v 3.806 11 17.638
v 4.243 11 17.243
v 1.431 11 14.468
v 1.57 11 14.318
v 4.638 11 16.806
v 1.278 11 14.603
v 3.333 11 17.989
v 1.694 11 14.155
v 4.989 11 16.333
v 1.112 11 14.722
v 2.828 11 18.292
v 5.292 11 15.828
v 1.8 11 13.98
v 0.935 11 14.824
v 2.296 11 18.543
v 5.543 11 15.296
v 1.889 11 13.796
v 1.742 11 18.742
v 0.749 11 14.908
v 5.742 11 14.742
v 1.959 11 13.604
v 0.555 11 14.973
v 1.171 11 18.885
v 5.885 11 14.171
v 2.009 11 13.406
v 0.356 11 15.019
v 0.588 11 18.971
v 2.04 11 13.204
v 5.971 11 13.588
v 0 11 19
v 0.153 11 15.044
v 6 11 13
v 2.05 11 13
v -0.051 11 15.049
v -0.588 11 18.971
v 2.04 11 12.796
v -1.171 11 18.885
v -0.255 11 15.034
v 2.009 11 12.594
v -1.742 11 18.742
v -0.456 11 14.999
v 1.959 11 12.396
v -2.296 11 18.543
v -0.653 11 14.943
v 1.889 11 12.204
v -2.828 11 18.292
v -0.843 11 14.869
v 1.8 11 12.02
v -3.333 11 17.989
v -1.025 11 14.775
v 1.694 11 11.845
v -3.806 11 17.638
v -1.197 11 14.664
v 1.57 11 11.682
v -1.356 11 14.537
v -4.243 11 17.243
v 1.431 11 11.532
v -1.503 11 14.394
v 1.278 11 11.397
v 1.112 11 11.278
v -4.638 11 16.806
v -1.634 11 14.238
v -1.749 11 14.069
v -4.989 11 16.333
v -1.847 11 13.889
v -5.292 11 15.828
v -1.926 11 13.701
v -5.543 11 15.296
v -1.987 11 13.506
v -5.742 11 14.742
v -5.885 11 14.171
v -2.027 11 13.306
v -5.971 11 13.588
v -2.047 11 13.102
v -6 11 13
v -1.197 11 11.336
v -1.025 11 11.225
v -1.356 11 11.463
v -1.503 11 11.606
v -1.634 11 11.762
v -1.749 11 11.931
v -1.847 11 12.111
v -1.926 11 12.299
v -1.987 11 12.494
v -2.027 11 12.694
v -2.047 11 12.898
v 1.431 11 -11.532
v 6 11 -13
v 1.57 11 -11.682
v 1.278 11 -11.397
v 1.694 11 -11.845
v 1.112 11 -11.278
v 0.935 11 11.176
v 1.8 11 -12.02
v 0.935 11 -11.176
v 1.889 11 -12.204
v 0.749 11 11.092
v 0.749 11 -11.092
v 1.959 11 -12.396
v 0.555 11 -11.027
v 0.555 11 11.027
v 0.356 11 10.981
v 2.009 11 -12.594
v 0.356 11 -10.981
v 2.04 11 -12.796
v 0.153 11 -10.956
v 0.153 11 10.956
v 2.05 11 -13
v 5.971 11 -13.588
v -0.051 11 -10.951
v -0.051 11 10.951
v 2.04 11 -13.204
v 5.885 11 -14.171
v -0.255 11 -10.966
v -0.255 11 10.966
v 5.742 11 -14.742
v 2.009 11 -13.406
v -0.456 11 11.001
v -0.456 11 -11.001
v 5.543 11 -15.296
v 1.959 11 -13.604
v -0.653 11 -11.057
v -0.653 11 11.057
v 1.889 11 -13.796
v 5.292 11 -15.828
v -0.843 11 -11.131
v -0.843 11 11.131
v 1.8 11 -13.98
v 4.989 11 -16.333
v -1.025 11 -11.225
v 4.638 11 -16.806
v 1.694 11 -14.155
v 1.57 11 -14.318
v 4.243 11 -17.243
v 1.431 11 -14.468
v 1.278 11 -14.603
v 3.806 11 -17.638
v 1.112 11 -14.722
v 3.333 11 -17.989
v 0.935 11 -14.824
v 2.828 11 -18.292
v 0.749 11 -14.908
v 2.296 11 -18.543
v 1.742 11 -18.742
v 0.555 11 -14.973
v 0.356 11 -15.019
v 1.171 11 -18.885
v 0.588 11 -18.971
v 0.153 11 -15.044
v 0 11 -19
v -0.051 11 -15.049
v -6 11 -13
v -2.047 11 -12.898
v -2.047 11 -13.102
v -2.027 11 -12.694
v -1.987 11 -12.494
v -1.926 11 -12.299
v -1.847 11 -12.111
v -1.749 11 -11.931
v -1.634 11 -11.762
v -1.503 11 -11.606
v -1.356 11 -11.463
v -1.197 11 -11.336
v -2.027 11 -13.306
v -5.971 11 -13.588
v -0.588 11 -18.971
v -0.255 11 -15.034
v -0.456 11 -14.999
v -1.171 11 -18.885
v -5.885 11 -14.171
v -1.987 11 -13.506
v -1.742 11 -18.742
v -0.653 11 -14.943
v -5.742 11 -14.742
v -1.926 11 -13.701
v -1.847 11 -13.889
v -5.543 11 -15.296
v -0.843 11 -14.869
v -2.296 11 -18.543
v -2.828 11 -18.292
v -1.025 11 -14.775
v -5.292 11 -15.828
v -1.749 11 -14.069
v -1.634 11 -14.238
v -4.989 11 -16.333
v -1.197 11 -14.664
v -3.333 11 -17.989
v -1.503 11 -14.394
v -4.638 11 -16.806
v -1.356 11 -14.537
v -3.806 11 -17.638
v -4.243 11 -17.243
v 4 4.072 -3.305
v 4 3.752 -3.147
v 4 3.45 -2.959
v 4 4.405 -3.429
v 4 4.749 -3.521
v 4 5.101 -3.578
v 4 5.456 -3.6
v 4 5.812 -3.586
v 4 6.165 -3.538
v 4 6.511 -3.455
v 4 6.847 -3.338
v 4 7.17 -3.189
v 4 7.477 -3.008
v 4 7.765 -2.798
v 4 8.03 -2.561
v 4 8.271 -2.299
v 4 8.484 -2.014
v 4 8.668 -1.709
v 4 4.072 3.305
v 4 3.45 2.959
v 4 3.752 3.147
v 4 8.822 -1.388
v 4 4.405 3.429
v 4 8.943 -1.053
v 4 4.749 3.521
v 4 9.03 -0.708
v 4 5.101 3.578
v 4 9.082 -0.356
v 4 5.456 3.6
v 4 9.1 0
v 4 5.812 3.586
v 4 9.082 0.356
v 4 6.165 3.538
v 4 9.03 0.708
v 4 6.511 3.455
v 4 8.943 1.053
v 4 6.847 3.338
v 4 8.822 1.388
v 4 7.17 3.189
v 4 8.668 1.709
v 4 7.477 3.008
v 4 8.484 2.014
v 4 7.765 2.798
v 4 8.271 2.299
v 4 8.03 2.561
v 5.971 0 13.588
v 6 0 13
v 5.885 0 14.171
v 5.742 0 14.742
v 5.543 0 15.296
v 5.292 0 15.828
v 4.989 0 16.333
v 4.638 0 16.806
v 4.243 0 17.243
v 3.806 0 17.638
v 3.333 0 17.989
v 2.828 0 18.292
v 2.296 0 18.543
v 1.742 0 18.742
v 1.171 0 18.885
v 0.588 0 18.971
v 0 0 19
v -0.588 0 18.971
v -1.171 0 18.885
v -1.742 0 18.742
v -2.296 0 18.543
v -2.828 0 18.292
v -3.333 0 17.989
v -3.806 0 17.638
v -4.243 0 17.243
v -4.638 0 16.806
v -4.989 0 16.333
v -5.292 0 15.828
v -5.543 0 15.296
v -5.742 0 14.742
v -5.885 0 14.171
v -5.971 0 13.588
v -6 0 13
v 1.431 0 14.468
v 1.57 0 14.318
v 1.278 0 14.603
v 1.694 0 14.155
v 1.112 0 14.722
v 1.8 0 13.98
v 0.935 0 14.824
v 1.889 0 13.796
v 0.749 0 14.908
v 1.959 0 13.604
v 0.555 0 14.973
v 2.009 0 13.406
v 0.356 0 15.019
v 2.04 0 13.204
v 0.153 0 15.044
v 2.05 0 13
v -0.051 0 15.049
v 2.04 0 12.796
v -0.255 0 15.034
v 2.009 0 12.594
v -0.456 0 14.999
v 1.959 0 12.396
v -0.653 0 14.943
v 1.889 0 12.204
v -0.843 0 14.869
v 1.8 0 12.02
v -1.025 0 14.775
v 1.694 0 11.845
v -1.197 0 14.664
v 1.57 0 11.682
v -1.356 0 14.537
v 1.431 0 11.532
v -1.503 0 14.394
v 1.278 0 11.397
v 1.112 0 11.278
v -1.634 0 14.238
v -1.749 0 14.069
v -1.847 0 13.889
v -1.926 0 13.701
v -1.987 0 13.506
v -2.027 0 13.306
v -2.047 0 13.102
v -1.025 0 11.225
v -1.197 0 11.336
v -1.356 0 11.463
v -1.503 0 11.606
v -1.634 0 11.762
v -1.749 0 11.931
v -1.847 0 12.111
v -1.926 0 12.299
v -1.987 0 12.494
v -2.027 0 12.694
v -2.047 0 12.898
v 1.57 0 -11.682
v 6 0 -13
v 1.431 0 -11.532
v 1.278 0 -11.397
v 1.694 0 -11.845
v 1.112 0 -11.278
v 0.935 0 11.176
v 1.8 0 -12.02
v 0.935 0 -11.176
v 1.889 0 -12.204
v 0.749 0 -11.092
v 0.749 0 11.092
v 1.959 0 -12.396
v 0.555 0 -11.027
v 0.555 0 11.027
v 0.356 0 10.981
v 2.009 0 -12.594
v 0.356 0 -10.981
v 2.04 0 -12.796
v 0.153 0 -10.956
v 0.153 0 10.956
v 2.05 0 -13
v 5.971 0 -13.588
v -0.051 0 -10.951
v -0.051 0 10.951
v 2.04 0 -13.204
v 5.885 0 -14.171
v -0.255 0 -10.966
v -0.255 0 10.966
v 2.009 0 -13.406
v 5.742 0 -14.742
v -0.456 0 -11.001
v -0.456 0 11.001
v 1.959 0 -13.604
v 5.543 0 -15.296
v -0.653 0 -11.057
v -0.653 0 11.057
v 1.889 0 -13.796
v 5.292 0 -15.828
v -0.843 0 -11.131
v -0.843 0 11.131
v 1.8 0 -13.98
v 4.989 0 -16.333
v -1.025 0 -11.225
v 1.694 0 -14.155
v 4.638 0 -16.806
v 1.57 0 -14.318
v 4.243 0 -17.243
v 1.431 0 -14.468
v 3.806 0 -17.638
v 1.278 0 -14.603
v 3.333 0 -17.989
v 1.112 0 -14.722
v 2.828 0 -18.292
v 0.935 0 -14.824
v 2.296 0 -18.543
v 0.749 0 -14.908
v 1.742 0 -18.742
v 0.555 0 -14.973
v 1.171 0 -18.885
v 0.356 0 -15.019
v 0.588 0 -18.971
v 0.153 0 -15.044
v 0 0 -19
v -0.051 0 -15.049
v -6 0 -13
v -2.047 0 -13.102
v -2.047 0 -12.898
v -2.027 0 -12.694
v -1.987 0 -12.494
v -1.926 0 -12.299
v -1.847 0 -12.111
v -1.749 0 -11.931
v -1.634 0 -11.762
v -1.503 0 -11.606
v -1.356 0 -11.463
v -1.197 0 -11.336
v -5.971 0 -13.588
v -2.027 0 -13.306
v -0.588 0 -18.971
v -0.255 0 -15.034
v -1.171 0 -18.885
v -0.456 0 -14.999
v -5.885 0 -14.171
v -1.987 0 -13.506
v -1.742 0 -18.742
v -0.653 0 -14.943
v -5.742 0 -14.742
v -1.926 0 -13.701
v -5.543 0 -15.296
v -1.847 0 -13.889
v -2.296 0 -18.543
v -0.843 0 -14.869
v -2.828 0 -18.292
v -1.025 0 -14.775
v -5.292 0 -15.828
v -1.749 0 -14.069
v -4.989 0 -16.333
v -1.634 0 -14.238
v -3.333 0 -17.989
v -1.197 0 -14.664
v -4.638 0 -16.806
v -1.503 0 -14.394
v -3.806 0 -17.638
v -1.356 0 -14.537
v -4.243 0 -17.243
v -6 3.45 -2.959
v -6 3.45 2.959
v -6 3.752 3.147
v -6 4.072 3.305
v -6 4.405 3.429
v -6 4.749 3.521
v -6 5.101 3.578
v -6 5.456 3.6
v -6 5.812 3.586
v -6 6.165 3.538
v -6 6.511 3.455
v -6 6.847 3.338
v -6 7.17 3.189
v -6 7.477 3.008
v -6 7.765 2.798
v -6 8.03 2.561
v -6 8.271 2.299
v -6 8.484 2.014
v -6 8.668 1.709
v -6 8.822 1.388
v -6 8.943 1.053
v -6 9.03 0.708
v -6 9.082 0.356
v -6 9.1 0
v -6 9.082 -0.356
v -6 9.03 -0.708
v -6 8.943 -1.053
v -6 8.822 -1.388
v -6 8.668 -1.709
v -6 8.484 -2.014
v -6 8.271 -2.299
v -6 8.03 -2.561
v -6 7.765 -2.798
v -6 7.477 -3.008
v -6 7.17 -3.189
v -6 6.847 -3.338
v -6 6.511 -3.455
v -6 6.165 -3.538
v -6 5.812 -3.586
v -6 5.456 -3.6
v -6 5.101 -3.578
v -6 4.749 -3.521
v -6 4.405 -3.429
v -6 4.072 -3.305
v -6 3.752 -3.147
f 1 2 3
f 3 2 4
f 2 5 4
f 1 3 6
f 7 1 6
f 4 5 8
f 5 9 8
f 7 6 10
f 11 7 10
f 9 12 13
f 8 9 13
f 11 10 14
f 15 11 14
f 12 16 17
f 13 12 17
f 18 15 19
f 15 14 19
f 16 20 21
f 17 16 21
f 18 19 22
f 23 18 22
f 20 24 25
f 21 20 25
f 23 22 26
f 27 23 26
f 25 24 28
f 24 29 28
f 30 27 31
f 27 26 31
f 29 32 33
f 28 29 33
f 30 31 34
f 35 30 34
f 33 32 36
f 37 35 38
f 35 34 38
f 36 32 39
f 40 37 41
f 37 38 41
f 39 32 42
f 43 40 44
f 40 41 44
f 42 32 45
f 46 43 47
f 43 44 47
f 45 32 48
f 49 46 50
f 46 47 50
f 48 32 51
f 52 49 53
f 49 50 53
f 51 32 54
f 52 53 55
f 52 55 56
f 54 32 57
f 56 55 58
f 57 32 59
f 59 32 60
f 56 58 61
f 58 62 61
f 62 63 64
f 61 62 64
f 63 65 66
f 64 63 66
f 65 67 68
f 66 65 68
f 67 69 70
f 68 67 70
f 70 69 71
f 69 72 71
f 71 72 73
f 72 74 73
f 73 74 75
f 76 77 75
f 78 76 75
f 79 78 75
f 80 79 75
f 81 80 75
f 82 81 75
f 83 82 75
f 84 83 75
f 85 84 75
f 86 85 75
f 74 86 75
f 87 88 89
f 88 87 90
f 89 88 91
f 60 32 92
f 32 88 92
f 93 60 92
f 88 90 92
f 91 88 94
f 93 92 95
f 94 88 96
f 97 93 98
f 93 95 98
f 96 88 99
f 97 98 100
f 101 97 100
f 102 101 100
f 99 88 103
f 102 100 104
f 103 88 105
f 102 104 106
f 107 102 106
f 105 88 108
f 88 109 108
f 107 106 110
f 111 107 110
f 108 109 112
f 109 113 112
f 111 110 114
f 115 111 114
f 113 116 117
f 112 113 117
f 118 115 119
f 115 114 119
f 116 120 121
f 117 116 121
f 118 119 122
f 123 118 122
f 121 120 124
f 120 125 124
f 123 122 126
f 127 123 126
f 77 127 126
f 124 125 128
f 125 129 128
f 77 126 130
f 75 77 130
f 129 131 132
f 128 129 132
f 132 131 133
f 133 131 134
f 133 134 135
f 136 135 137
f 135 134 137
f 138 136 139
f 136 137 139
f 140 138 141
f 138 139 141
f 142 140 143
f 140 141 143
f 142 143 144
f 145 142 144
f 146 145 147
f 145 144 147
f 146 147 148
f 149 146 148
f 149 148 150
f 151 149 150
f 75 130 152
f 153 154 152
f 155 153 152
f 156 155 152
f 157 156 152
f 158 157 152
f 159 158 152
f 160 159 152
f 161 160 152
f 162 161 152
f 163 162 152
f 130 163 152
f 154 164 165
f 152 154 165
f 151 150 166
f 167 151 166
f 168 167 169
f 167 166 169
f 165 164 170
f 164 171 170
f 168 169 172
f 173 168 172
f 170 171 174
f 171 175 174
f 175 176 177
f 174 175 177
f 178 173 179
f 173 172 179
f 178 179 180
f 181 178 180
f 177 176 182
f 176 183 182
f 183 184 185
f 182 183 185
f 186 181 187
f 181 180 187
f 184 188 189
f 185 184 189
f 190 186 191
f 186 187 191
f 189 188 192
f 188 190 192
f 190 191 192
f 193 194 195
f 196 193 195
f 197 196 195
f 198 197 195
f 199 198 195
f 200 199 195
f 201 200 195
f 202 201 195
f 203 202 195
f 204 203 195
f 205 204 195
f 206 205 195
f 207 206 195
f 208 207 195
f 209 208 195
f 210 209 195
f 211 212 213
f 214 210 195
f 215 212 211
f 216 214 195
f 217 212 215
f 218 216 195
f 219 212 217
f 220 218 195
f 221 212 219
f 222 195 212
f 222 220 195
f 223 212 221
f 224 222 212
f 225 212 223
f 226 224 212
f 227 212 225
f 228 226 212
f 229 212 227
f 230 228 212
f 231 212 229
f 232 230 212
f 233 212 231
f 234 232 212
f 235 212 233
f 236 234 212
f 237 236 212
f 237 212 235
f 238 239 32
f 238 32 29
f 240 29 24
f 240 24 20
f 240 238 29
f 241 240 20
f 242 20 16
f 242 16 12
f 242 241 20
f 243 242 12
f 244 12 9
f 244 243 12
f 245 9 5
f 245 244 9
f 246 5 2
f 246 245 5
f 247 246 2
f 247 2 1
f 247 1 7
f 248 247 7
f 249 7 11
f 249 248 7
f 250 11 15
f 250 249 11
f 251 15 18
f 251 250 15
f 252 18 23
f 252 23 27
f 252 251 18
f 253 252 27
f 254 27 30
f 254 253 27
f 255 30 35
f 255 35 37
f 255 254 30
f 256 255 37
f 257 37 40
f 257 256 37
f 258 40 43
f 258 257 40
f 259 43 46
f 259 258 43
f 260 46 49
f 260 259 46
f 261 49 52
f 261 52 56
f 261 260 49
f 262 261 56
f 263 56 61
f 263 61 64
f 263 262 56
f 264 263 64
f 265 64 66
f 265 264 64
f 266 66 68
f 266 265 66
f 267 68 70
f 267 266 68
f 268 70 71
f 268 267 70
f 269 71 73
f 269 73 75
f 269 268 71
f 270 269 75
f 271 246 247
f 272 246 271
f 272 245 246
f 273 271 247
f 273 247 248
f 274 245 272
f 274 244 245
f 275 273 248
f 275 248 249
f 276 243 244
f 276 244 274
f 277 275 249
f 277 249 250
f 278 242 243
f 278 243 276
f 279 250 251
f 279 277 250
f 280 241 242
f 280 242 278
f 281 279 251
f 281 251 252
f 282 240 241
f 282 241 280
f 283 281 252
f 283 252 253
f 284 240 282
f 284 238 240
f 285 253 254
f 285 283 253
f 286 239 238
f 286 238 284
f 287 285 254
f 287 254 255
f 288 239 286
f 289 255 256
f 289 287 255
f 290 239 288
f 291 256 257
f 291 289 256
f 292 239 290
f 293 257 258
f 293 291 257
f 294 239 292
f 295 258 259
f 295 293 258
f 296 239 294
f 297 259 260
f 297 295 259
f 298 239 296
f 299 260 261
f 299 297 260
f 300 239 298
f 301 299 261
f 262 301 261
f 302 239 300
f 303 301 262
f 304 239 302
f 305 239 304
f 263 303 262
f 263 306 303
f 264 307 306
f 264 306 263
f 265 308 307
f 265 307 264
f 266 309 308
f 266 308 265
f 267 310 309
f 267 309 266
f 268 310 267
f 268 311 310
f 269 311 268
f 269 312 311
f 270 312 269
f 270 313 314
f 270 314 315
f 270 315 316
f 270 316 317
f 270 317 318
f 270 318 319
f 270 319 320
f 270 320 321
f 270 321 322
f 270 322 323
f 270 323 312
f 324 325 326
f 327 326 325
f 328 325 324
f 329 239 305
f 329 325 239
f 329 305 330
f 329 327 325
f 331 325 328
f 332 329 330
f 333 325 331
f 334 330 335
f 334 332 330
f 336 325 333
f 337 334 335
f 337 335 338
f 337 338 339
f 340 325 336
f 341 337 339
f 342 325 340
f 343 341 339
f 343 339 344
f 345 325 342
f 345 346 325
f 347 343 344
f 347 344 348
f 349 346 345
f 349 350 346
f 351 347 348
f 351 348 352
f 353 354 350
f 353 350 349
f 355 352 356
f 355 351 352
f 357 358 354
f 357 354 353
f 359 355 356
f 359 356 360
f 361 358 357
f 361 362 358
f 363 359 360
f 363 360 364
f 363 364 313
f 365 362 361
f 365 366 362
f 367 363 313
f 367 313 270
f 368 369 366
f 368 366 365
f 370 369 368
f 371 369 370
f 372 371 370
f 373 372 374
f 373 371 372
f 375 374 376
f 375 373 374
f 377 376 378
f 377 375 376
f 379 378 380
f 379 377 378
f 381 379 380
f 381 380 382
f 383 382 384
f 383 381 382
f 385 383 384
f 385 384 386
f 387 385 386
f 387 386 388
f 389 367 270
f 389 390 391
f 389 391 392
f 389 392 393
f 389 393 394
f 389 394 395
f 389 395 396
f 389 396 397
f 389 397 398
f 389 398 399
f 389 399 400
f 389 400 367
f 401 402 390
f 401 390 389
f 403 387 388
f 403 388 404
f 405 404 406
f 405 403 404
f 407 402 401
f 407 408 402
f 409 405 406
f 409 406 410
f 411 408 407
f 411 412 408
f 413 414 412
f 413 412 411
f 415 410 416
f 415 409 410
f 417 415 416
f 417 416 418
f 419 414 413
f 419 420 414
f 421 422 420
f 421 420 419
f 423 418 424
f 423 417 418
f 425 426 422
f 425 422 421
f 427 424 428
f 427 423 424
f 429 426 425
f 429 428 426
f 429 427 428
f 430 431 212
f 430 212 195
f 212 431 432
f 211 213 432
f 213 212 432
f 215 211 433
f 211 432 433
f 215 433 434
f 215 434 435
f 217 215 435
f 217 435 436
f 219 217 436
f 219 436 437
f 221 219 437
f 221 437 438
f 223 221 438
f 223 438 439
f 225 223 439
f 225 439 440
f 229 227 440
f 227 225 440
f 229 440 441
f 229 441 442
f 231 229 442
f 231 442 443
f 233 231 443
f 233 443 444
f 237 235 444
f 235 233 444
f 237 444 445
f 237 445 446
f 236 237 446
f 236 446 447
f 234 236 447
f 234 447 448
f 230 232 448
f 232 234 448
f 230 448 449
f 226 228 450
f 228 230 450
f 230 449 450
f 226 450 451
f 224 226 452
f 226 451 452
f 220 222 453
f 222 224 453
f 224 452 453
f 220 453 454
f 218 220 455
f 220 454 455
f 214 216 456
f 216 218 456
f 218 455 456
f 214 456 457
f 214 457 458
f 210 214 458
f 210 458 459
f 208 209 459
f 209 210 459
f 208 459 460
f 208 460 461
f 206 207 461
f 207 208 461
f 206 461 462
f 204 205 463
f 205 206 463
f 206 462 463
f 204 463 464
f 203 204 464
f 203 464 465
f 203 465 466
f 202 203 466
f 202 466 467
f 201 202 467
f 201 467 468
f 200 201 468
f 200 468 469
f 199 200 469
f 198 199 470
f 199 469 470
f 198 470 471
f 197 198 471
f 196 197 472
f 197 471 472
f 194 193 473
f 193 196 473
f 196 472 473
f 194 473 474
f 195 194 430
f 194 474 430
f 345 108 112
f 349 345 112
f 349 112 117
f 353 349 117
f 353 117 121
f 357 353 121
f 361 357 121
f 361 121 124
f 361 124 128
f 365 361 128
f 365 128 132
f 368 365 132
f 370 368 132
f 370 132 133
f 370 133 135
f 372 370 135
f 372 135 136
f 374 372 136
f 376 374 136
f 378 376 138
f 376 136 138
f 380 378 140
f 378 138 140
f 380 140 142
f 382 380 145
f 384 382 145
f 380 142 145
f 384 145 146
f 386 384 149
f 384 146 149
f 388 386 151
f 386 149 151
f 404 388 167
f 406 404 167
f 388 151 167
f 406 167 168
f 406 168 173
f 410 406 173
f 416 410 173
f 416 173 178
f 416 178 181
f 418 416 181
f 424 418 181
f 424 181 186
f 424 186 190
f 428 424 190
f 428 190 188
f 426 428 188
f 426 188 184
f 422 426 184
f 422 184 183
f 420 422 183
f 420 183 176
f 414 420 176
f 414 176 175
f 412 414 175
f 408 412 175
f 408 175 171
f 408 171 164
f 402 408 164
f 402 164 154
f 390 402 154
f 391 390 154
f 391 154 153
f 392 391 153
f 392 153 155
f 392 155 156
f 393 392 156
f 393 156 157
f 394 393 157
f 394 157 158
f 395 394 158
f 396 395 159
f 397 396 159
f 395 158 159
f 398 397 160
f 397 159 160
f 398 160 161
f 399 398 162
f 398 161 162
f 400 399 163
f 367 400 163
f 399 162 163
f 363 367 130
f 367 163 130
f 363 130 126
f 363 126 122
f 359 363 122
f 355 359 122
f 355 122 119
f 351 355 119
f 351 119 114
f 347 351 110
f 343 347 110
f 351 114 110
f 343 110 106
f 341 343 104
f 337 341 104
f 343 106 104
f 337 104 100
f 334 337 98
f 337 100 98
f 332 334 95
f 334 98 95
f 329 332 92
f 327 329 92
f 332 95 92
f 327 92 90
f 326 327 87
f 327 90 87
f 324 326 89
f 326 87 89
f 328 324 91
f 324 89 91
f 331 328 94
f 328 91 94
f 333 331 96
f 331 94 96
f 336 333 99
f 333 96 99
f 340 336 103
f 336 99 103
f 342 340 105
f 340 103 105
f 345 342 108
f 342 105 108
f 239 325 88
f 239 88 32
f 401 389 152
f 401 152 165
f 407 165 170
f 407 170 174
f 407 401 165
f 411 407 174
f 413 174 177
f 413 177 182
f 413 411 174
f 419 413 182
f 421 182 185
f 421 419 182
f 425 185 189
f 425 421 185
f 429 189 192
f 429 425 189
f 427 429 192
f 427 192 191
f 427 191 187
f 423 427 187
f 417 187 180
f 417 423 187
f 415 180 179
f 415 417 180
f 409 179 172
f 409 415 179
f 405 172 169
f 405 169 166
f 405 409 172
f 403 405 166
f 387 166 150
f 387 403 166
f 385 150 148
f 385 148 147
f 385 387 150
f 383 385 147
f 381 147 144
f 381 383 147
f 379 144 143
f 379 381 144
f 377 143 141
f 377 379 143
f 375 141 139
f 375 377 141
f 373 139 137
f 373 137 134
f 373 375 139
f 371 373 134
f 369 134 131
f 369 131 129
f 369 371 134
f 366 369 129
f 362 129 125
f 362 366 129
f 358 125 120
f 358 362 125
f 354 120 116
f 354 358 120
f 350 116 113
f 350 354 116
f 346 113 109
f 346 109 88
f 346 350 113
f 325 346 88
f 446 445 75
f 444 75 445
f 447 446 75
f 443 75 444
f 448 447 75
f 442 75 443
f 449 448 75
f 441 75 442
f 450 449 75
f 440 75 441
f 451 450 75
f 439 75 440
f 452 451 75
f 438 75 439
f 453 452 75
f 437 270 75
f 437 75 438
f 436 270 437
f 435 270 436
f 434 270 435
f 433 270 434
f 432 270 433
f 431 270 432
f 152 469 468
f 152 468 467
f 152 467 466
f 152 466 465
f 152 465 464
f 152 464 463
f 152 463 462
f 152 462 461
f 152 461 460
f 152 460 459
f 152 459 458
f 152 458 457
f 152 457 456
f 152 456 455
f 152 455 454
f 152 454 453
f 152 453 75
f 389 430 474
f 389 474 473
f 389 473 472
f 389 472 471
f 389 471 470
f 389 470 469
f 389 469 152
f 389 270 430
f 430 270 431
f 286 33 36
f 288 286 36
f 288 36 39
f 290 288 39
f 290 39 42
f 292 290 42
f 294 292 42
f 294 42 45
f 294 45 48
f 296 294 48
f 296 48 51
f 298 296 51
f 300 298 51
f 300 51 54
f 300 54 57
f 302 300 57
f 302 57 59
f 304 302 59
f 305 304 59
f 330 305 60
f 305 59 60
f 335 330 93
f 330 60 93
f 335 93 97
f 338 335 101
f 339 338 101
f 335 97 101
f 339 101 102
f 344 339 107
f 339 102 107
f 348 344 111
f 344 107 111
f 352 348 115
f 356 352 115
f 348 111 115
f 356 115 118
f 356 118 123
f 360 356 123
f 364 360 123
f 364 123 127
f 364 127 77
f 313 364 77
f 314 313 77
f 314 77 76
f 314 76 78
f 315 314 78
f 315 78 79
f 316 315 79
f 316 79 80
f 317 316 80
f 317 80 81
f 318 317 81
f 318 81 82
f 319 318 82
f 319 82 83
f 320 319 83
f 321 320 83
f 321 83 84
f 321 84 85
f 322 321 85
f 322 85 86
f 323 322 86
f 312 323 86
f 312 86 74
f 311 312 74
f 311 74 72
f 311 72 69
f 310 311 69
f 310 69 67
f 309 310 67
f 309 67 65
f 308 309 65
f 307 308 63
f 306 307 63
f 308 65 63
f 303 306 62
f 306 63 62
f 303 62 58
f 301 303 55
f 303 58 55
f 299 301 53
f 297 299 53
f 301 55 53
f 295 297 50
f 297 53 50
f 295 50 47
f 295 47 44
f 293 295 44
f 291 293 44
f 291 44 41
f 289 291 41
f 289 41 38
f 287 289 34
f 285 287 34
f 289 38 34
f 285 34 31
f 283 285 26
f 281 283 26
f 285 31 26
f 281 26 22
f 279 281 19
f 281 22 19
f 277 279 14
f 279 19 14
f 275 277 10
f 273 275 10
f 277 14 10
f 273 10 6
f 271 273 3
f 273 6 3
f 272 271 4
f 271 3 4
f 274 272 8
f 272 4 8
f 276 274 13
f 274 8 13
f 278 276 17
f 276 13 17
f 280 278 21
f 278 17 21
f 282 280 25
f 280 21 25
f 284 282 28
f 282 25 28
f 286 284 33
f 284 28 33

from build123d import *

# Parameters (mm, degrees)
EXTRUDE_1_DEPTH     = 11
SKETCH_2_R          = 2.05
CUT_EXTRUDE_1_DEPTH = 12
SKETCH_3_R          = 3.6
CUT_EXTRUDE_2_DEPTH = 10
EXTRUDE_3_DEPTH     = 10


with BuildPart() as part:
    # 草图1 → 凸台-拉伸1 (new body)
    with BuildSketch(Plane(origin=(0, 0, 0), x_dir=(1, 0, 0), z_dir=(0, 1, 0))):
        with BuildLine():
            Line((-6, -13), (-6, 13))
            ThreePointArc((-6, 13), (0, 19), (6, 13))
            Line((6, 13), (6, -13))
            ThreePointArc((6, -13), (0, -19), (-6, -13))
        make_face()
    extrude(amount=EXTRUDE_1_DEPTH)

    # 草图2 → 切除-拉伸1 (cut, through all)
    with BuildSketch(Plane(origin=(0, 11, 0), x_dir=(1, 0, 0), z_dir=(0, 1, 0))):
        with Locations((0, 13)):
            Circle(SKETCH_2_R)
        with Locations((0, -13)):
            Circle(SKETCH_2_R)
    extrude(amount=-CUT_EXTRUDE_1_DEPTH, mode=Mode.SUBTRACT)

    # 草图3 → 切除-拉伸2 (cut)
    with BuildSketch(Plane.ZY.offset(6)):
        with Locations((0, 5.5)):
            Circle(SKETCH_3_R)
    extrude(amount=-CUT_EXTRUDE_2_DEPTH, mode=Mode.SUBTRACT)

    # 草图4 → 凸台-拉伸3 (add)
    with BuildSketch(Plane.ZY.offset(6)):
        with BuildLine():
            Line((2.959307351, 3.45), (-2.959307351, 3.45))
            ThreePointArc((-2.959307351, 3.45), (0, 1.9), (2.959307351, 3.45))
        make_face()
    extrude(amount=-EXTRUDE_3_DEPTH)


solid = part.part
